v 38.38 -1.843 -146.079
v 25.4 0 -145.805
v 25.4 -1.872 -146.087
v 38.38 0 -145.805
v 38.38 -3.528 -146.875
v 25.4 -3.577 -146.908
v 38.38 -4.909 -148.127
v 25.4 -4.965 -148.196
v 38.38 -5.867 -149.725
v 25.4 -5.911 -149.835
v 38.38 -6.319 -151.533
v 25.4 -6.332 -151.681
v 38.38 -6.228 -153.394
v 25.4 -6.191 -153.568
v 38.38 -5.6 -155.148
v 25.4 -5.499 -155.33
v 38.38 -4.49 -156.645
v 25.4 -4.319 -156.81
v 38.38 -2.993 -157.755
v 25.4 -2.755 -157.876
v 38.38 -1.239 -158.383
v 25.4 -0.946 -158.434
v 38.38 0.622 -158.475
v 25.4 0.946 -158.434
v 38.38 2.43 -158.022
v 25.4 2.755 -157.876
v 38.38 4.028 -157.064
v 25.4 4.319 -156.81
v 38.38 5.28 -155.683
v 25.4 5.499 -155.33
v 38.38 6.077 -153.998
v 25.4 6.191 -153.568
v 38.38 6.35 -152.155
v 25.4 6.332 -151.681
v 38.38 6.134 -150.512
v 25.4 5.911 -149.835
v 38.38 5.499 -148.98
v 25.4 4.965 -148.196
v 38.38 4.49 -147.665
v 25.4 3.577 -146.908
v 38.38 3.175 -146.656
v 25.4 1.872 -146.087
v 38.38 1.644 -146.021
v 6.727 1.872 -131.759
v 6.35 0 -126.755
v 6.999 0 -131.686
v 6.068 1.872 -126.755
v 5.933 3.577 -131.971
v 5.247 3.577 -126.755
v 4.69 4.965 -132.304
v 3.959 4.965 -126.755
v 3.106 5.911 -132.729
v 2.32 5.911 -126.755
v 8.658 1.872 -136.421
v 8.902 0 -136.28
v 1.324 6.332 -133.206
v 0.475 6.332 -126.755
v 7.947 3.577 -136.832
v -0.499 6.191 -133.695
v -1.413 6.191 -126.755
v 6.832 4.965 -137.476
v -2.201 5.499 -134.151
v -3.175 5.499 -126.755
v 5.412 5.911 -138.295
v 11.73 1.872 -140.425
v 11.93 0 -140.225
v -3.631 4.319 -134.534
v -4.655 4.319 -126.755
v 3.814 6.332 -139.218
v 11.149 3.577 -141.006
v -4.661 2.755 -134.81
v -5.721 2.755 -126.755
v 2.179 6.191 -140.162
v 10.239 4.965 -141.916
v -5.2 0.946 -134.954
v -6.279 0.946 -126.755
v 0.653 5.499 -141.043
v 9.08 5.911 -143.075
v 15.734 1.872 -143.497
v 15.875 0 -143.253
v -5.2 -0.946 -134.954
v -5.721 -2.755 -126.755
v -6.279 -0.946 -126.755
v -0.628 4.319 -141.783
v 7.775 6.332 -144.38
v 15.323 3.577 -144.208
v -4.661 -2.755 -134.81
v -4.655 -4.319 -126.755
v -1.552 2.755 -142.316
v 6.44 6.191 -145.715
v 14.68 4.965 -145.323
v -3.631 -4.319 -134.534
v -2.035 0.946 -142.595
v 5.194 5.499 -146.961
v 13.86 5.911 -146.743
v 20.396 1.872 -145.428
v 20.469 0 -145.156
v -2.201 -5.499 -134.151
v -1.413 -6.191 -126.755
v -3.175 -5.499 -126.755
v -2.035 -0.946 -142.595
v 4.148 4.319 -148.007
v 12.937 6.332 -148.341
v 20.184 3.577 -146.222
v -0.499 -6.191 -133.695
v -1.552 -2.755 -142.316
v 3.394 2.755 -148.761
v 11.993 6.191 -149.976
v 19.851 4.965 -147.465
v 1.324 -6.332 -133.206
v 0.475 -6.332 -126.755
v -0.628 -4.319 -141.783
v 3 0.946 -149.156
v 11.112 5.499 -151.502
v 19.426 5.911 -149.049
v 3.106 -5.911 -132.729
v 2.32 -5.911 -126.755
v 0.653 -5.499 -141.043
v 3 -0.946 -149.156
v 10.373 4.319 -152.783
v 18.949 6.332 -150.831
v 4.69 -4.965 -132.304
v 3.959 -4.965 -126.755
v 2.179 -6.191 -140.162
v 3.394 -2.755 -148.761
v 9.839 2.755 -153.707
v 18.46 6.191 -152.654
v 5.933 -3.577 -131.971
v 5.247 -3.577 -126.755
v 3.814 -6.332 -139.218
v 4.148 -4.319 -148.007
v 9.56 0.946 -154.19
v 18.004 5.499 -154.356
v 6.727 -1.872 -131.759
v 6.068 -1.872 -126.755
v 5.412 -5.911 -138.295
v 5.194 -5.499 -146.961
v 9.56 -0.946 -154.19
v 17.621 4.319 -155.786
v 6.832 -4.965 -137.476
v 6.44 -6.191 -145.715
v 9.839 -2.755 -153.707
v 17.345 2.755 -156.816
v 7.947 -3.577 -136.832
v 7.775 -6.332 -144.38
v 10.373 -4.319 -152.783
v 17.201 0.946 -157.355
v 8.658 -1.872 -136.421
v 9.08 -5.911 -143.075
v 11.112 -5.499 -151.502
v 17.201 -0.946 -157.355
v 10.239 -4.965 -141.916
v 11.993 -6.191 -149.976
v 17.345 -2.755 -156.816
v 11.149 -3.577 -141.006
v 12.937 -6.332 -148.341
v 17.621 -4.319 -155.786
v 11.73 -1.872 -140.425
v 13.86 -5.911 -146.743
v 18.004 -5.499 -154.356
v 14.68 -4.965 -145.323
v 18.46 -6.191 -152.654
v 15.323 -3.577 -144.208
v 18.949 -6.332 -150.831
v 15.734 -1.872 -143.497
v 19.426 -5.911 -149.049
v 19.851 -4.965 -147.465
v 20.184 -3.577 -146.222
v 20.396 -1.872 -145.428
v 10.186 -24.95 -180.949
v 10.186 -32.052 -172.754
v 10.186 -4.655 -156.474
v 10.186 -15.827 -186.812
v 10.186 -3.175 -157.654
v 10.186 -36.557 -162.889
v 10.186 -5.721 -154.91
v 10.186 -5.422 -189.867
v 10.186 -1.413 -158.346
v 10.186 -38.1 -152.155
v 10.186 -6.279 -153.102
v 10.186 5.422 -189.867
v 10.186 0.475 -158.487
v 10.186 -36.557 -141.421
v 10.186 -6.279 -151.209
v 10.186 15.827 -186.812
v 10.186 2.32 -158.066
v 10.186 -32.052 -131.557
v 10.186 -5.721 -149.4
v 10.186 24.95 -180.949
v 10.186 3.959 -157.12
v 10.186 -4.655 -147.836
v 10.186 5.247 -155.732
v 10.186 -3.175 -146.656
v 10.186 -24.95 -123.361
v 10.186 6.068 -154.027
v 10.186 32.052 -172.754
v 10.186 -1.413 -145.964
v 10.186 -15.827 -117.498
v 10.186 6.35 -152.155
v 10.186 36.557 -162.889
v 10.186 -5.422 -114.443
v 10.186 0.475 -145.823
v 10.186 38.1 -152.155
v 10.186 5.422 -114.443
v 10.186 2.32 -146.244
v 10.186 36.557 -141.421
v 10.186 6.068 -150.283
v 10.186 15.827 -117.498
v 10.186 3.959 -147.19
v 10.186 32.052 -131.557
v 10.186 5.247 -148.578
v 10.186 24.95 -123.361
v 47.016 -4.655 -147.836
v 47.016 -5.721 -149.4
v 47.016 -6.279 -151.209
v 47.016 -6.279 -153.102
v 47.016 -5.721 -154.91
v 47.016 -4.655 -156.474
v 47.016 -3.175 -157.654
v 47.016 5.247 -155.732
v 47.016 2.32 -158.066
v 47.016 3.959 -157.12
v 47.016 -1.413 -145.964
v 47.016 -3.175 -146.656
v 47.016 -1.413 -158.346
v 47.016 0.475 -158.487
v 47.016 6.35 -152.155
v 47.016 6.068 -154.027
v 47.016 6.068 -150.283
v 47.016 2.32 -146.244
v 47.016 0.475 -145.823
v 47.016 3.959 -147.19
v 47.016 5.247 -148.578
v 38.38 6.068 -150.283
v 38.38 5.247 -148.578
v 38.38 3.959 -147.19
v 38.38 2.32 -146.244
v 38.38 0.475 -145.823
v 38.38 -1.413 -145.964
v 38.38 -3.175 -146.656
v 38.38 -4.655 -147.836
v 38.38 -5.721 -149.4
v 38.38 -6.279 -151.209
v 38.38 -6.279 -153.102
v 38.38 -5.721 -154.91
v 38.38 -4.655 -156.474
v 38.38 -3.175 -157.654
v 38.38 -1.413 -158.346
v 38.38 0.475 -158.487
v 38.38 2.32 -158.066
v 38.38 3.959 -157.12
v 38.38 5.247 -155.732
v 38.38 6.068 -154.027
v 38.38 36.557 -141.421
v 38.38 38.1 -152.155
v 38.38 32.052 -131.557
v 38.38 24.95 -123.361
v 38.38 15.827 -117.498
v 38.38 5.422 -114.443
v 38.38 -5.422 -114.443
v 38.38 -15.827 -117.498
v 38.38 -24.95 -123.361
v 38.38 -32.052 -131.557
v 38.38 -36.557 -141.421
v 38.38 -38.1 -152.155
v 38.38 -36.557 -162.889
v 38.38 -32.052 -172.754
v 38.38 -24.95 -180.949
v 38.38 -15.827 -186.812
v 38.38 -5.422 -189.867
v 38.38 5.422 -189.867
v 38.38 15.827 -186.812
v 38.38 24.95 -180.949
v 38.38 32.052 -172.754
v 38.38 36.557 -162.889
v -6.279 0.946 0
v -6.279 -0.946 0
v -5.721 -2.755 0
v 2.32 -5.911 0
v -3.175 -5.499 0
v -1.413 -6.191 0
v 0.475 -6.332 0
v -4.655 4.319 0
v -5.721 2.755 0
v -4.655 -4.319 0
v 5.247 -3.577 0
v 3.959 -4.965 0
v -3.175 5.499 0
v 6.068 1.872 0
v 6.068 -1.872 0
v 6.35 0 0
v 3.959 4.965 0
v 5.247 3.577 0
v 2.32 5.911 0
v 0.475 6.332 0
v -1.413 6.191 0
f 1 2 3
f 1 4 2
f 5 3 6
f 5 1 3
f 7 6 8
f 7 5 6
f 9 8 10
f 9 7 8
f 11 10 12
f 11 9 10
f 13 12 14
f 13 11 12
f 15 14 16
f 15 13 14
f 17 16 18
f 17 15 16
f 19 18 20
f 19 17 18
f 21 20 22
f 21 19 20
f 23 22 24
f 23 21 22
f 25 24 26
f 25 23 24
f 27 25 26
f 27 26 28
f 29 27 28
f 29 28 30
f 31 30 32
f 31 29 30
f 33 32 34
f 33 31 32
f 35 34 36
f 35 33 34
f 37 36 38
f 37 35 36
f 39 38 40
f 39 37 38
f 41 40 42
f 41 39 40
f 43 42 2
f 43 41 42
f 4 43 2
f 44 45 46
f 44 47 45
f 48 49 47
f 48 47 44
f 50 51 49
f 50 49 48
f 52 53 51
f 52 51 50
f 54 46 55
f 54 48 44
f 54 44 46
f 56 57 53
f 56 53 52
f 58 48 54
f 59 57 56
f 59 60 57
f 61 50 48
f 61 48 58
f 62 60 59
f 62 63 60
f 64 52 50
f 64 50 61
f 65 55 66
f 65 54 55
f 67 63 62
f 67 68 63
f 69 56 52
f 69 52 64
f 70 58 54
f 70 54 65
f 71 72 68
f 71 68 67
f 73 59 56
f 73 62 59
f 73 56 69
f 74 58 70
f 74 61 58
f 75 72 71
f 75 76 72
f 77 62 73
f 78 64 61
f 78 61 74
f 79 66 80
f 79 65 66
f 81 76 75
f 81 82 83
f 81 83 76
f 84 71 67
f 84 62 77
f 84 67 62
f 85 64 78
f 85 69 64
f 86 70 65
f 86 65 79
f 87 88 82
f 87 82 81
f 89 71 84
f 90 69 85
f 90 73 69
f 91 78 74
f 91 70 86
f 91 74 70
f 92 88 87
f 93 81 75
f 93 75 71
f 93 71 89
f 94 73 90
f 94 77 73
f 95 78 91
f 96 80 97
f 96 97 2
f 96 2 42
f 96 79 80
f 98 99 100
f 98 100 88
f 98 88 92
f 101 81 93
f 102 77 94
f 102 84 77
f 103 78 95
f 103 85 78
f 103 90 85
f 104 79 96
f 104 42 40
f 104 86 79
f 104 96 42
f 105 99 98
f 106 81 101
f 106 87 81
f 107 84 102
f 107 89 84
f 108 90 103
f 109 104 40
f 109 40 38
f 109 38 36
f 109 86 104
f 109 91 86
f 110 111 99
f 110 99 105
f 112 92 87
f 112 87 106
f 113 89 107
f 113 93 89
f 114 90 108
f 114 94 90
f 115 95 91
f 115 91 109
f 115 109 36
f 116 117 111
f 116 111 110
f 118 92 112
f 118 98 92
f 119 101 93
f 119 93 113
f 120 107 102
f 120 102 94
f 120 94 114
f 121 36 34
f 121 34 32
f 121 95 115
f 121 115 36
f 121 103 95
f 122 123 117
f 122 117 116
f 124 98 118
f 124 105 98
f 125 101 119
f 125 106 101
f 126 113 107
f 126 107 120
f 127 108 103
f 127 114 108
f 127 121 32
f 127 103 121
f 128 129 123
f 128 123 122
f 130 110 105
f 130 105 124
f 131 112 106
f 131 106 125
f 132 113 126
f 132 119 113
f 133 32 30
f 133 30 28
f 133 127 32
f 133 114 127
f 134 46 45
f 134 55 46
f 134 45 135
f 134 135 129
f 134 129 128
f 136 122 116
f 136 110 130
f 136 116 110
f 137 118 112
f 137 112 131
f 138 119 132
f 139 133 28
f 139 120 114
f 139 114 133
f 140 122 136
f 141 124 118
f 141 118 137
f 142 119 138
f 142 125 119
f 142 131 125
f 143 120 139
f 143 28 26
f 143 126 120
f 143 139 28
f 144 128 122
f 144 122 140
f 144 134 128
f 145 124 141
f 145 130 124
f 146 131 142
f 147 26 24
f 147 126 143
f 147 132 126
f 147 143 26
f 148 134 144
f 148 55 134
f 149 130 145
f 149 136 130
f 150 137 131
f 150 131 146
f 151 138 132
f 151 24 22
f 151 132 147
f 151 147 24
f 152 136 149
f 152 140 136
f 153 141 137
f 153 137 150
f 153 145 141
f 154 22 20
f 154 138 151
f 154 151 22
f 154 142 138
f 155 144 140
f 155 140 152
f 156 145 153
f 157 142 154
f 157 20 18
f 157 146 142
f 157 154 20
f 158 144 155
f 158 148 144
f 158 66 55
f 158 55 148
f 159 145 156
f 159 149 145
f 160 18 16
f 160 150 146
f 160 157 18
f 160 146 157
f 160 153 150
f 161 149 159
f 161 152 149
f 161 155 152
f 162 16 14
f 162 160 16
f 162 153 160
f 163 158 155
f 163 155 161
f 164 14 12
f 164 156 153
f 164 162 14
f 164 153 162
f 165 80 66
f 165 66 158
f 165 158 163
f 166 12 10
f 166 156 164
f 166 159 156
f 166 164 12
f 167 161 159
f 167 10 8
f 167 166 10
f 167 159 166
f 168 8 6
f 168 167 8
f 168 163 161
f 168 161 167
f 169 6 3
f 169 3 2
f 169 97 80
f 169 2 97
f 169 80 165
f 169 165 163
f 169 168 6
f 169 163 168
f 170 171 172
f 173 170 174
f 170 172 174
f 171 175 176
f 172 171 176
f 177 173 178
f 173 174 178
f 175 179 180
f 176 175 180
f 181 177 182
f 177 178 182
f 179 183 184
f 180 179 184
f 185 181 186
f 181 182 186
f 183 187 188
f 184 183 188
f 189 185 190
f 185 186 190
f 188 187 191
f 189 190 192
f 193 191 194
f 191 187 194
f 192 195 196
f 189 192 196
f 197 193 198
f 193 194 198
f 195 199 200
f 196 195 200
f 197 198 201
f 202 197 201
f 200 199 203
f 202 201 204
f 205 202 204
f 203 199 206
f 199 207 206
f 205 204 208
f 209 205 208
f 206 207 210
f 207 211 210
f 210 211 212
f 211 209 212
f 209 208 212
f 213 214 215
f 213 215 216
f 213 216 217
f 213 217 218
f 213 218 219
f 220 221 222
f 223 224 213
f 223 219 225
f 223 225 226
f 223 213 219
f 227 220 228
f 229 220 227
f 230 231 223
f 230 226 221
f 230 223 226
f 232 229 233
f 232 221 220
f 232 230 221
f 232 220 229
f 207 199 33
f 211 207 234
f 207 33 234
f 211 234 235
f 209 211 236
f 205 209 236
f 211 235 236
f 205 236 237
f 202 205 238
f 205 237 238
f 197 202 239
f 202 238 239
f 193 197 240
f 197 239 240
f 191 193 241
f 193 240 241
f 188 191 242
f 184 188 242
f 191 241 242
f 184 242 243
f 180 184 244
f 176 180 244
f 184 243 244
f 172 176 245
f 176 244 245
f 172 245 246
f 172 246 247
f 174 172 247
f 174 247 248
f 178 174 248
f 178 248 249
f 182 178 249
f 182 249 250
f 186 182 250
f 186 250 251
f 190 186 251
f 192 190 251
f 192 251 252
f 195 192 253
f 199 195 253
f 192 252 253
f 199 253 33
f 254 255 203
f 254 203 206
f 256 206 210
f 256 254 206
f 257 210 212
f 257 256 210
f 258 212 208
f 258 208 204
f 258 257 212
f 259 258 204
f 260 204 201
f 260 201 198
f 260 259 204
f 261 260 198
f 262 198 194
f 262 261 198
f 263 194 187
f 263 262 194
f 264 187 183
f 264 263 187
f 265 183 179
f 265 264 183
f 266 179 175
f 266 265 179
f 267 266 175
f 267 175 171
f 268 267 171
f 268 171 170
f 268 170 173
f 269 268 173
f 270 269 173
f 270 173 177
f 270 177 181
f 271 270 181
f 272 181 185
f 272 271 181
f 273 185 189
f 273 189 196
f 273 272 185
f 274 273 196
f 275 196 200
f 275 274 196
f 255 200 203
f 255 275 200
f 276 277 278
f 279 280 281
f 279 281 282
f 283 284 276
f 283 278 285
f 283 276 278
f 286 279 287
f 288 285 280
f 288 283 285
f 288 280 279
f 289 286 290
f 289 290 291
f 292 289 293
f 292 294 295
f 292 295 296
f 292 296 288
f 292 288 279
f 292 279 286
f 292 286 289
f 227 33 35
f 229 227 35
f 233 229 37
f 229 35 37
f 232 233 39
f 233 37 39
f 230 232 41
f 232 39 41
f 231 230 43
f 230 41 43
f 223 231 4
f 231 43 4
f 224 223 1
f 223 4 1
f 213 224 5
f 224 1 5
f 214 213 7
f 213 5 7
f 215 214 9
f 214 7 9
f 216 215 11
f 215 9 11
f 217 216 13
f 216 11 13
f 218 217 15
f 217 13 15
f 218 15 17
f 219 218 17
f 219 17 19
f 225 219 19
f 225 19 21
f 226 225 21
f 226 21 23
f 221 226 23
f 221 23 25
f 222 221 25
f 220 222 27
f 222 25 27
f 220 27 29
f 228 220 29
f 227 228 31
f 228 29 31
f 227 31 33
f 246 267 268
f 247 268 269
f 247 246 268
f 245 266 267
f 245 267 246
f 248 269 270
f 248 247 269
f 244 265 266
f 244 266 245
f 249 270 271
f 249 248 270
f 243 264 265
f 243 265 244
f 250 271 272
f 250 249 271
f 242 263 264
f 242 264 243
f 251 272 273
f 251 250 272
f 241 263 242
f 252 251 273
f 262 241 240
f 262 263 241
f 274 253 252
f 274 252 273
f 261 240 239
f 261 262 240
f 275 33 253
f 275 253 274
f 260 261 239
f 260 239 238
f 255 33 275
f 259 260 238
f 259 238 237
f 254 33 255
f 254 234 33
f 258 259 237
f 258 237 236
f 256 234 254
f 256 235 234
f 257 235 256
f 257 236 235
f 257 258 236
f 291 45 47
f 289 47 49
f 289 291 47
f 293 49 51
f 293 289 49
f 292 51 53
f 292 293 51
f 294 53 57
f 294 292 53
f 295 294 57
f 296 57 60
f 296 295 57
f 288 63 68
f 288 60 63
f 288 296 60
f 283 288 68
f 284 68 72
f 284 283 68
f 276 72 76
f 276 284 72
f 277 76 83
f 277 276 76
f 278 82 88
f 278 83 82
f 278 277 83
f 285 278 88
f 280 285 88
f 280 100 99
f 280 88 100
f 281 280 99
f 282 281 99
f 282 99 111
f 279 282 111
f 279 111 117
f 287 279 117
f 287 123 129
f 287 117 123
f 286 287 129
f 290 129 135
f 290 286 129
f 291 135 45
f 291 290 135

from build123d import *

# Parameters (mm, degrees)
F0_R      = 6.35
F1_DEPTH  = 101.6
F1_FACE_R = 6.35
F4_R      = 38.1
F4_R_2    = 6.35
F5_DEPTH  = 28.194
F6_R      = 6.35
F7_DEPTH  = 8.636


with BuildPart() as f1:
    # F0 (on Top) → F1 (new body)
    with BuildSketch(Plane.XY):
        Circle(F0_R)
    extrude(amount=-F1_DEPTH)

    # F3: sweep along a path in F2
    with BuildLine(Plane.XZ) as f3_path:
        Line((0, -100.055642426), (0, -126.7550863981))
        ThreePointArc((0, -126.7550863981), (7.4394877579, -144.7155986403), (25.4, -152.1550863981))
        Line((25.4, -152.1550863981), (38.380023092, -152.1550863981))
    # F1_face (on face) → F3 (sweep)
    with BuildSketch(Plane(origin=(0, 0, -101.6), x_dir=(1, 0, 0), z_dir=(0, 0, -1))):
        Circle(F1_FACE_R)
    sweep(path=f3_path.line)

    # F6 (on face) → F7 (join)
    with BuildSketch(Plane.YZ.offset(38.380023092)):
        with Locations((0, -152.1550863981)):
            Circle(F6_R)
    extrude(amount=F7_DEPTH)


with BuildPart() as f5:
    # F4 (on face) → F5 (new body)
    with BuildSketch(Plane.YZ.offset(38.380023092)):
        with Locations((0, -152.1550863981)):
            Circle(F4_R)
        with Locations((0, -152.1550863981)):
            Circle(F4_R_2, mode=Mode.SUBTRACT)
    extrude(amount=-F5_DEPTH)


solid = Compound([f1.part, f5.part])
